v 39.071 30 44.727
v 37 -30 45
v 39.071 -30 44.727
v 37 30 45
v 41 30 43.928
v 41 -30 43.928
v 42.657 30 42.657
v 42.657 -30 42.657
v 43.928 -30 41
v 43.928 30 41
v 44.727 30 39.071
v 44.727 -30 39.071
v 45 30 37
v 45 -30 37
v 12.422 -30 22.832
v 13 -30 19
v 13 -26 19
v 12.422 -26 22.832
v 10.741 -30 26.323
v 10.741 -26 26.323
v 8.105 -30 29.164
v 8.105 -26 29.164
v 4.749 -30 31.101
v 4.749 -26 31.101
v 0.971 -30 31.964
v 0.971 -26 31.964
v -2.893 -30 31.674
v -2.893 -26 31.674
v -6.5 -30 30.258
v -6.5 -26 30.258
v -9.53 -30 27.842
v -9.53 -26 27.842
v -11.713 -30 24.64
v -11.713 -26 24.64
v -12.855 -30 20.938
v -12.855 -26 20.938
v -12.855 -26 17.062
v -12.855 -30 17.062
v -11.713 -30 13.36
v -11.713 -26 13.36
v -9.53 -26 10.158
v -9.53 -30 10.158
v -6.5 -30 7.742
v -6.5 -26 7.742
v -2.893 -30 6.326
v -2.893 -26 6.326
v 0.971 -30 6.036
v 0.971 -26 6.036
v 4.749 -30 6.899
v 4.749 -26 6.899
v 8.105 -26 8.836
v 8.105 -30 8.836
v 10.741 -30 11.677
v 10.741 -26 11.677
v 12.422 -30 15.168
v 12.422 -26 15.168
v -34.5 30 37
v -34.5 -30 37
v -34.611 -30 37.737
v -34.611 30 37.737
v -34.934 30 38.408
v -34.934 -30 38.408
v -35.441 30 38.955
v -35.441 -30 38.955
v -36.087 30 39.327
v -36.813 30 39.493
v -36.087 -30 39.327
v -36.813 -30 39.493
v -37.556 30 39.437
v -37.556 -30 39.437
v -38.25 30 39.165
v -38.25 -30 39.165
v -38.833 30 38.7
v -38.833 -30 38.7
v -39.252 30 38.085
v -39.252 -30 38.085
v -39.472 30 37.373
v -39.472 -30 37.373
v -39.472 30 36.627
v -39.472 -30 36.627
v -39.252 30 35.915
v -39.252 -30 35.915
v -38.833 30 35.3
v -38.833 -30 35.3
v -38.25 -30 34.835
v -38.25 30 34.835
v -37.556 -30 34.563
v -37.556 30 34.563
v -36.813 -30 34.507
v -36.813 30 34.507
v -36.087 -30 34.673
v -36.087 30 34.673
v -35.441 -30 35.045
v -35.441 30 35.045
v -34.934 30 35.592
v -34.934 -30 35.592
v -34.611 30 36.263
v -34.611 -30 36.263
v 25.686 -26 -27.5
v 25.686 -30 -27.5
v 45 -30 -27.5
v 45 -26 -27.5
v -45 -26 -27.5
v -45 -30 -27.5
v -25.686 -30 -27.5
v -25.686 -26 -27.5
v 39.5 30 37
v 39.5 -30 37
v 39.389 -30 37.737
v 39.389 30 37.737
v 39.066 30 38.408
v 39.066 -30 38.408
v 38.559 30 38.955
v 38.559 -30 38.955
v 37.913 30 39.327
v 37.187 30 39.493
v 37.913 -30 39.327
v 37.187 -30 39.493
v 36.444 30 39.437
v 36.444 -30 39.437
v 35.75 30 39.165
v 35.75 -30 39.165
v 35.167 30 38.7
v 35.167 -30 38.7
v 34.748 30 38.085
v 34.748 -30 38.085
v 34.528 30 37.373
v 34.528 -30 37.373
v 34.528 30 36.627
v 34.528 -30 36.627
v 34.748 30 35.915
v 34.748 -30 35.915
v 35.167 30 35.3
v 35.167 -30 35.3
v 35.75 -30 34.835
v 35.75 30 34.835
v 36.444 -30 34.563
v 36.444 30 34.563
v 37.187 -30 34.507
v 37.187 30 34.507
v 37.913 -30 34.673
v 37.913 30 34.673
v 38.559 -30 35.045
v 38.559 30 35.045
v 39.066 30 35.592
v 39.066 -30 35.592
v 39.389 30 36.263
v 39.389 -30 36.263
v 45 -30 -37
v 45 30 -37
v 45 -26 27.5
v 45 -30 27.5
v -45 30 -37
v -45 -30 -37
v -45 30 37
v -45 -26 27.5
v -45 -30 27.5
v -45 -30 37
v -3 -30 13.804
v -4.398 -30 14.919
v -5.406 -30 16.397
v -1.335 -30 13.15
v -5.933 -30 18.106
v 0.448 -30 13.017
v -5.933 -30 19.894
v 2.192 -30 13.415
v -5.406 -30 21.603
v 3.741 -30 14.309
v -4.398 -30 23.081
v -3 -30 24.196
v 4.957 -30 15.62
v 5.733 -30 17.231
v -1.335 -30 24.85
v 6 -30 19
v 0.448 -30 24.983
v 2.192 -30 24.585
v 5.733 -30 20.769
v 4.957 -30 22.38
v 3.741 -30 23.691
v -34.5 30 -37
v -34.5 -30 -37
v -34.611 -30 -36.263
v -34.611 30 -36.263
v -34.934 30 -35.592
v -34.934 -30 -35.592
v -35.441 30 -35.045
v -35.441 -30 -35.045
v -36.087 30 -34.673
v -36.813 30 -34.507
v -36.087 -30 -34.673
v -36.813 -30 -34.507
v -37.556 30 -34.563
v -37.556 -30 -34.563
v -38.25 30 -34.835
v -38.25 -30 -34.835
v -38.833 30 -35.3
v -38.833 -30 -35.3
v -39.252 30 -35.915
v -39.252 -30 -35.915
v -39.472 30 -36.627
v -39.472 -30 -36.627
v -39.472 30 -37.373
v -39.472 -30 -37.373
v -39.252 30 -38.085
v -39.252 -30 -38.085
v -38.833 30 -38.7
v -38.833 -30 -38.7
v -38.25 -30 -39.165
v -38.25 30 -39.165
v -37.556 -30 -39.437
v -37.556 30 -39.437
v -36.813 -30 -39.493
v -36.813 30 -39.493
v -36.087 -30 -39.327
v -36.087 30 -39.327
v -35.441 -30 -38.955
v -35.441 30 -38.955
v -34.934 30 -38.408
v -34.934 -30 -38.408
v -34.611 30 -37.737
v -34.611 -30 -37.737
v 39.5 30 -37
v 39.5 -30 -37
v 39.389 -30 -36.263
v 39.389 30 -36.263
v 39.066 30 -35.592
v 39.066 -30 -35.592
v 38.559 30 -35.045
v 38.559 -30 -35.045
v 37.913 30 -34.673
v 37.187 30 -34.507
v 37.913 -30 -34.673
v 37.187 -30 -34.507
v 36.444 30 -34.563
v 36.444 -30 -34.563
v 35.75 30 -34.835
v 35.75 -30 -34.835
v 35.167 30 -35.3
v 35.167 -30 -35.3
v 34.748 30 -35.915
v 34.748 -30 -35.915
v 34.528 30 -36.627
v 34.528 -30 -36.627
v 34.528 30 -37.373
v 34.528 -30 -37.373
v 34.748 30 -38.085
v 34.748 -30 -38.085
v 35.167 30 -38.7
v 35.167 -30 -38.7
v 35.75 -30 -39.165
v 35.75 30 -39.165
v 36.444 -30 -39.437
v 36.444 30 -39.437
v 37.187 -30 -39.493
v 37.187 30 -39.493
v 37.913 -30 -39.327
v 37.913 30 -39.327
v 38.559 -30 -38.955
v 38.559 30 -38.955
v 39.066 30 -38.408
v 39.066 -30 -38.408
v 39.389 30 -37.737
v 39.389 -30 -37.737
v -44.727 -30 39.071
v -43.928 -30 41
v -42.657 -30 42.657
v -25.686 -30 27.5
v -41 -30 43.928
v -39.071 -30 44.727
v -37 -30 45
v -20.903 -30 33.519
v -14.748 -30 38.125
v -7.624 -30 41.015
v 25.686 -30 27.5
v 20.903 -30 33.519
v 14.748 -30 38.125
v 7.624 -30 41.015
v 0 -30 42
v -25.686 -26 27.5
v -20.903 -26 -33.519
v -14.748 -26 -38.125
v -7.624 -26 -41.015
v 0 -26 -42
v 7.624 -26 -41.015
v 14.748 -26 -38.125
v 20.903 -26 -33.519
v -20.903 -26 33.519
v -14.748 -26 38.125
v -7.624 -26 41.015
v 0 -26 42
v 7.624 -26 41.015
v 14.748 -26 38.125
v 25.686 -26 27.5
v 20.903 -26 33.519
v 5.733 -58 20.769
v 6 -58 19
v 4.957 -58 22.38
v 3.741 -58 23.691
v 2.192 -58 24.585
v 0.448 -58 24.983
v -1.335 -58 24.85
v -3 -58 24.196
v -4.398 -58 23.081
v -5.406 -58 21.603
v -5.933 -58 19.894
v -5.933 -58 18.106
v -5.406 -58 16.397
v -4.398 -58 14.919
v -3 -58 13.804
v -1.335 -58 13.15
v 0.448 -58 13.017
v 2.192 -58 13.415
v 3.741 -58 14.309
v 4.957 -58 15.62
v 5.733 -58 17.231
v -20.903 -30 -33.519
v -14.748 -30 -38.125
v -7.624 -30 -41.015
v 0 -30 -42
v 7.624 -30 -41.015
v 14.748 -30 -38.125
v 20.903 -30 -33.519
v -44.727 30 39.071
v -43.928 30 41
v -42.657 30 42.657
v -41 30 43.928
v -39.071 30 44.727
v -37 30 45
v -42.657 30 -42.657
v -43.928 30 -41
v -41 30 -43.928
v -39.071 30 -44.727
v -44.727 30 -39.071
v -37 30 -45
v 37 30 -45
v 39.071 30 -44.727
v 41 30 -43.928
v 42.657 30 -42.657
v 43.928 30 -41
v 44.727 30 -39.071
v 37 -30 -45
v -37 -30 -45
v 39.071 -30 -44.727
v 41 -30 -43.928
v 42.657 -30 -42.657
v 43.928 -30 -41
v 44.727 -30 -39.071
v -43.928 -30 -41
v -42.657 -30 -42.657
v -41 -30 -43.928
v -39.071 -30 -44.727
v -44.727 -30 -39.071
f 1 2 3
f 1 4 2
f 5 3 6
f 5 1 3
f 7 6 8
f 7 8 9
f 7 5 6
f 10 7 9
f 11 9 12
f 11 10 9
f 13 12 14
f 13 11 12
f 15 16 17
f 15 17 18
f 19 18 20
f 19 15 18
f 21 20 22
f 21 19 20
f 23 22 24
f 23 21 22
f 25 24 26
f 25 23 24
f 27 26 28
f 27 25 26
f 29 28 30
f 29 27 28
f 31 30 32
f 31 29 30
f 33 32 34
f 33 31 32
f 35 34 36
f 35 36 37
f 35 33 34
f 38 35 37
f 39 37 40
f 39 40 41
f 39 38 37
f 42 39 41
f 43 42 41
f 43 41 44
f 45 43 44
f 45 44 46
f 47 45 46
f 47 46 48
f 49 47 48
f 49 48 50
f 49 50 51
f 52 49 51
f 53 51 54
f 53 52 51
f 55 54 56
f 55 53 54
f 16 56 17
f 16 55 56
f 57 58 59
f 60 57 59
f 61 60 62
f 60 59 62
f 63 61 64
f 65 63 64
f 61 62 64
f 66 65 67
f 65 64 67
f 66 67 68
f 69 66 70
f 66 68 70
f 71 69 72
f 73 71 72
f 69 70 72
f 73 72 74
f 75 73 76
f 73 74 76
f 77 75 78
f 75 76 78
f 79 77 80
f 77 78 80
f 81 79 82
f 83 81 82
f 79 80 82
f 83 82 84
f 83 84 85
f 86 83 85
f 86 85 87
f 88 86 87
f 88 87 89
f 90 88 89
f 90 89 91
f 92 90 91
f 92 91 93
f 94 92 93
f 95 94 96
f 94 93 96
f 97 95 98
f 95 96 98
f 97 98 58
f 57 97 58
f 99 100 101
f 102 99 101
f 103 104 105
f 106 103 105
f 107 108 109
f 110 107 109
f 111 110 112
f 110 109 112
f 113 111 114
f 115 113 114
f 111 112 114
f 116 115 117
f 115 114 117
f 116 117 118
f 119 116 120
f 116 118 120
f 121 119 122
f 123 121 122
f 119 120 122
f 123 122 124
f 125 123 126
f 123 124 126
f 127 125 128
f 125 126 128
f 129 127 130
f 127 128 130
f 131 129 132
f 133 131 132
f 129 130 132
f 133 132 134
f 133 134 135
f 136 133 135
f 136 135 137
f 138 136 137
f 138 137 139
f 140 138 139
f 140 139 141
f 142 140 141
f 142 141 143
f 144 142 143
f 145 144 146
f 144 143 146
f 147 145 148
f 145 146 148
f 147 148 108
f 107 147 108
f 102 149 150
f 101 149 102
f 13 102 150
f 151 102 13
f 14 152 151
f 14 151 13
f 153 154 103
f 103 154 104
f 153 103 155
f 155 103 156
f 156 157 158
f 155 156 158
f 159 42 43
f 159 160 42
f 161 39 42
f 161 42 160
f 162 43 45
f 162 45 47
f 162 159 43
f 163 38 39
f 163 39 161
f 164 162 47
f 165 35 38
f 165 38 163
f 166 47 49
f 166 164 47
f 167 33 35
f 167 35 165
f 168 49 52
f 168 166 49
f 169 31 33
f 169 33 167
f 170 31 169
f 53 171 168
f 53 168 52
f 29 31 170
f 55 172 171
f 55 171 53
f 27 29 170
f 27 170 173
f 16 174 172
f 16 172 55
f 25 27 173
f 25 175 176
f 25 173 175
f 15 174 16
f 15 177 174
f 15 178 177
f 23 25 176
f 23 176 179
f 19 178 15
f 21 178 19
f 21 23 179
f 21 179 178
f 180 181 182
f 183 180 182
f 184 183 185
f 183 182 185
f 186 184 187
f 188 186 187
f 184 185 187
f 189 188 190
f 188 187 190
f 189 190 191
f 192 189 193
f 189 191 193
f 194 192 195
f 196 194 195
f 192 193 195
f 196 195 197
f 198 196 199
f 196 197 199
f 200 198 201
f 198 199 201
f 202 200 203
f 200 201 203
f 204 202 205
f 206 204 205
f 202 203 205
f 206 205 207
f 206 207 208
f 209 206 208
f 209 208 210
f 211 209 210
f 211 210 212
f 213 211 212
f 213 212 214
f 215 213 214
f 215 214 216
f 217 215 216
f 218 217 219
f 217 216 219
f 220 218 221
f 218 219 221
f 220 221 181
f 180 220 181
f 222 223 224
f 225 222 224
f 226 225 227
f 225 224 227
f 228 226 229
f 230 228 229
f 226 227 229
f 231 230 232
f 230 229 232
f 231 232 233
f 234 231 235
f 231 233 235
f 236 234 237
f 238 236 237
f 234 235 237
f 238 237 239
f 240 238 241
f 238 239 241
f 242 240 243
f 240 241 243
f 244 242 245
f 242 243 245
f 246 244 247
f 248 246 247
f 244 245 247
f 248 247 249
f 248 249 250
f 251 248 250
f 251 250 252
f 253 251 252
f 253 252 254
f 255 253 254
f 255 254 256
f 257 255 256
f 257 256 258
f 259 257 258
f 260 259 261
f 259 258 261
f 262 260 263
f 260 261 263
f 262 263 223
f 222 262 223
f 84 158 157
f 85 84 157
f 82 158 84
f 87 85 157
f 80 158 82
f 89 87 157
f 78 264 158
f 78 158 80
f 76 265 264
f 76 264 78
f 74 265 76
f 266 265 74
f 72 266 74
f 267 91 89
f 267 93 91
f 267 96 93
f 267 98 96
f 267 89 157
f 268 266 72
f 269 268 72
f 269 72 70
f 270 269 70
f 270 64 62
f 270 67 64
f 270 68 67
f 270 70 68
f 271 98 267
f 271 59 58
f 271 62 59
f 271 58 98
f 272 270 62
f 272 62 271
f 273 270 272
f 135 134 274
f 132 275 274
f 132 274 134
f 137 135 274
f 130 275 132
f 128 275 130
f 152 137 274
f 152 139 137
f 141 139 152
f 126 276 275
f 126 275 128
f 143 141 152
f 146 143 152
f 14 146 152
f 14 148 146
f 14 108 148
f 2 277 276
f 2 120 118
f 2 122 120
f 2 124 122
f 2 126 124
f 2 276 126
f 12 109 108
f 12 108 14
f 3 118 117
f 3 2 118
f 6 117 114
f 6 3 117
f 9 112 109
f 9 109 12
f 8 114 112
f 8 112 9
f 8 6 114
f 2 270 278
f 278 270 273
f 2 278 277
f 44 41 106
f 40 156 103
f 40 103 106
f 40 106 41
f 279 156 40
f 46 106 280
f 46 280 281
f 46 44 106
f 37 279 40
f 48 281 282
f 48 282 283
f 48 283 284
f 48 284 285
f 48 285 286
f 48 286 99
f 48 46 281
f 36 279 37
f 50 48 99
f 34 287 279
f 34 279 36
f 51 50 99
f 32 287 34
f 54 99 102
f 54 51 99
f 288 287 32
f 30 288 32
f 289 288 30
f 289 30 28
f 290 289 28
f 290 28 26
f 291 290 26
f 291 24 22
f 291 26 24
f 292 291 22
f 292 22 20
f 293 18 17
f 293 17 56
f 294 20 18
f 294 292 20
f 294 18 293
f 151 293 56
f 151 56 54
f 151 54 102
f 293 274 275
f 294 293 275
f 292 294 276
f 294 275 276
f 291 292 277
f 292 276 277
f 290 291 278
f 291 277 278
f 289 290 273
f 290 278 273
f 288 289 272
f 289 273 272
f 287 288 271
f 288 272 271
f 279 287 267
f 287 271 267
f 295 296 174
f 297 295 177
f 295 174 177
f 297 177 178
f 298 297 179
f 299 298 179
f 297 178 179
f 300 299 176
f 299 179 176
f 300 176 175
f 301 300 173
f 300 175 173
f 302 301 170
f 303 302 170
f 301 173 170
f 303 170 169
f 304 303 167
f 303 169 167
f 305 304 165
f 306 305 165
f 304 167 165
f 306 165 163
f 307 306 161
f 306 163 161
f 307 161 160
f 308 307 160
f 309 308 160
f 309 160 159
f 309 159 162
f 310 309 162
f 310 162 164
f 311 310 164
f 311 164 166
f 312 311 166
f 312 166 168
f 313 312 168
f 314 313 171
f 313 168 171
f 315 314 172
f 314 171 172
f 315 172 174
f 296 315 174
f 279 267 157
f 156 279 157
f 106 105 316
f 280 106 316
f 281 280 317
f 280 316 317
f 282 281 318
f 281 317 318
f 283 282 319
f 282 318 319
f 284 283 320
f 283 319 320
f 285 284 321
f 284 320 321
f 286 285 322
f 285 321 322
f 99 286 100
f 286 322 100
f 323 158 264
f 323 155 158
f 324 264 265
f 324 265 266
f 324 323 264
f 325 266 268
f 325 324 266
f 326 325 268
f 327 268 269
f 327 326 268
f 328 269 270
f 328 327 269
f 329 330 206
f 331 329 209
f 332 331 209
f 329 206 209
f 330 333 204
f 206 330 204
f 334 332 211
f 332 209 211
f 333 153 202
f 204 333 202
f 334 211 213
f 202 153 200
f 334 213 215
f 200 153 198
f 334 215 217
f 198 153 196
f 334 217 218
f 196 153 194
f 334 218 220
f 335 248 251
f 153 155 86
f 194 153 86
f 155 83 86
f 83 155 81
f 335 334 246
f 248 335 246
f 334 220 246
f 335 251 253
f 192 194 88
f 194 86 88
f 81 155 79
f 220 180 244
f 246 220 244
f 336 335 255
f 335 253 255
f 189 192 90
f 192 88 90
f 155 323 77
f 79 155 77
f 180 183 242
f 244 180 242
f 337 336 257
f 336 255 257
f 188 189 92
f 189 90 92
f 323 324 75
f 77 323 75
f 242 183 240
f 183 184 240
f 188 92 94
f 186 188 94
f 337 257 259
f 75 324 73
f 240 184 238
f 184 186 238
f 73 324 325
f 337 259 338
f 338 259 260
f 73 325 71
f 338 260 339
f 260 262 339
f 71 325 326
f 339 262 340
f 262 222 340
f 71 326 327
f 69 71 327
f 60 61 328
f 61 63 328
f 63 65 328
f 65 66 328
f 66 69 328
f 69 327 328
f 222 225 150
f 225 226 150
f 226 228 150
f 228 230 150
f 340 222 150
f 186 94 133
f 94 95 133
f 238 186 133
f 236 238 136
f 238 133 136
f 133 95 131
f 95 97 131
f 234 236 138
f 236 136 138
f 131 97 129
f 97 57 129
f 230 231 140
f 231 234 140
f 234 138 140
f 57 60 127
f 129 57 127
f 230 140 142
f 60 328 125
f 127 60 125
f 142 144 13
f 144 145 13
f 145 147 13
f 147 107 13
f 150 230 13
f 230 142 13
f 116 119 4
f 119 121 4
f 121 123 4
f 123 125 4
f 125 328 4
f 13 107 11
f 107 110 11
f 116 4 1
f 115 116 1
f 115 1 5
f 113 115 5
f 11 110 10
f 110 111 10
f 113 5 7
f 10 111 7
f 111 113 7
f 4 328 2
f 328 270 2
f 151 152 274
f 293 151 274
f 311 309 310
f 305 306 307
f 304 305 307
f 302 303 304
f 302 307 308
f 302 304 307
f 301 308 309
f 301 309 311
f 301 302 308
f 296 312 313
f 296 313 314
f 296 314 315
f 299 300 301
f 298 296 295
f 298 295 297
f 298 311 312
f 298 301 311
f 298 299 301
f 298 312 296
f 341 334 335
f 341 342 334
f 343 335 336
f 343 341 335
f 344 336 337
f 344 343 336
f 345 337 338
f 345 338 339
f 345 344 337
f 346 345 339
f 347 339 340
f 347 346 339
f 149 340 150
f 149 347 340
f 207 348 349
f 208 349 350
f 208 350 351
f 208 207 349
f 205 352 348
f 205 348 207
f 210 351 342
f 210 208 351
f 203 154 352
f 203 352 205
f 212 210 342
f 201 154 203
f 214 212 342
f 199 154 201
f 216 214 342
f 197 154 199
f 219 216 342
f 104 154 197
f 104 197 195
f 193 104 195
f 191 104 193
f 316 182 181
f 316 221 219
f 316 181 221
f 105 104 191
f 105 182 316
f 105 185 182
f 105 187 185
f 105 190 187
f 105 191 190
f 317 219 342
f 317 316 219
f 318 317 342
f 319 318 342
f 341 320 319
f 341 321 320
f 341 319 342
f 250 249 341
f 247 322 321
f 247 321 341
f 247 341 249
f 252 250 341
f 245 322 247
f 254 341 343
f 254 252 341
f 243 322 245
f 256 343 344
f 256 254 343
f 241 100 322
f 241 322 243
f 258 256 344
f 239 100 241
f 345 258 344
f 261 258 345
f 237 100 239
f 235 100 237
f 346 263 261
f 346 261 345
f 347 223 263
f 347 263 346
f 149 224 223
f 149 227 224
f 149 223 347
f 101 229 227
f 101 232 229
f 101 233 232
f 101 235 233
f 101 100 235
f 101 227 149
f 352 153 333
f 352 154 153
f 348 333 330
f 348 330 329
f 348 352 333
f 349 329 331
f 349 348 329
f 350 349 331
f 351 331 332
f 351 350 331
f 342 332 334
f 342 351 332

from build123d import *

# Parameters (mm, degrees)
F0_W          = 90
F0_H          = 90
F1_DEPTH      = 30
F1_DEPTH_BACK = 30
F2_R          = 13
F3_DEPTH      = 4
F2_R_2        = 2.5
F4_DEPTH      = 60
F2_R_3        = 6
F5_DEPTH      = 28
F6_R          = 8


with BuildPart() as f1:
    # F0 (on Front) → F1 (new body, two sides)
    with BuildSketch(Plane.XZ) as f1_sk:
        Rectangle(F0_W, F0_H)
    extrude(amount=F1_DEPTH)
    extrude(f1_sk.sketch, amount=-F1_DEPTH_BACK)

    # F2 (on face) → F3 (cut)
    with BuildSketch(Plane.XZ.offset(30)):
        with BuildLine():
            Line((-25.685599, 27.5), (-45, 27.5))
            Line((-45, 27.5), (-45, -27.5))
            Line((-45, -27.5), (-25.685599, -27.5))
            ThreePointArc((-25.685599, -27.5), (0, -42), (25.685599, -27.5))
            Line((25.685599, -27.5), (45, -27.5))
            Line((45, -27.5), (45, 27.5))
            Line((45, 27.5), (25.685599, 27.5))
            ThreePointArc((25.685599, 27.5), (0, 42), (-25.685599, 27.5))
        make_face()
        with Locations((0, 19)):
            Circle(F2_R, mode=Mode.SUBTRACT)
    extrude(amount=-F3_DEPTH, mode=Mode.SUBTRACT)

    # F2 (on face) → F4 (cut)
    with BuildSketch(Plane.XZ.offset(30)):
        with Locations((-37, 37)):
            Circle(F2_R_2)
        with Locations((37, 37)):
            Circle(F2_R_2)
        with Locations((37, -37)):
            Circle(F2_R_2)
        with Locations((-37, -37)):
            Circle(F2_R_2)
    extrude(amount=-F4_DEPTH, mode=Mode.SUBTRACT)

    # F2 (on face) → F5 (join)
    with BuildSketch(Plane.XZ.offset(30)):
        with Locations((0, 19)):
            Circle(F2_R_3)
    extrude(amount=F5_DEPTH)

    # F6
    f6_edges = [f1.edges().sort_by_distance(p)[0] for p in [
        (45, 0, 45),
        (45, 0, -45),
        (-45, 0, -45),
        (-45, 0, 45),
    ]]
    fillet(f6_edges, radius=F6_R)


solid = f1.part
